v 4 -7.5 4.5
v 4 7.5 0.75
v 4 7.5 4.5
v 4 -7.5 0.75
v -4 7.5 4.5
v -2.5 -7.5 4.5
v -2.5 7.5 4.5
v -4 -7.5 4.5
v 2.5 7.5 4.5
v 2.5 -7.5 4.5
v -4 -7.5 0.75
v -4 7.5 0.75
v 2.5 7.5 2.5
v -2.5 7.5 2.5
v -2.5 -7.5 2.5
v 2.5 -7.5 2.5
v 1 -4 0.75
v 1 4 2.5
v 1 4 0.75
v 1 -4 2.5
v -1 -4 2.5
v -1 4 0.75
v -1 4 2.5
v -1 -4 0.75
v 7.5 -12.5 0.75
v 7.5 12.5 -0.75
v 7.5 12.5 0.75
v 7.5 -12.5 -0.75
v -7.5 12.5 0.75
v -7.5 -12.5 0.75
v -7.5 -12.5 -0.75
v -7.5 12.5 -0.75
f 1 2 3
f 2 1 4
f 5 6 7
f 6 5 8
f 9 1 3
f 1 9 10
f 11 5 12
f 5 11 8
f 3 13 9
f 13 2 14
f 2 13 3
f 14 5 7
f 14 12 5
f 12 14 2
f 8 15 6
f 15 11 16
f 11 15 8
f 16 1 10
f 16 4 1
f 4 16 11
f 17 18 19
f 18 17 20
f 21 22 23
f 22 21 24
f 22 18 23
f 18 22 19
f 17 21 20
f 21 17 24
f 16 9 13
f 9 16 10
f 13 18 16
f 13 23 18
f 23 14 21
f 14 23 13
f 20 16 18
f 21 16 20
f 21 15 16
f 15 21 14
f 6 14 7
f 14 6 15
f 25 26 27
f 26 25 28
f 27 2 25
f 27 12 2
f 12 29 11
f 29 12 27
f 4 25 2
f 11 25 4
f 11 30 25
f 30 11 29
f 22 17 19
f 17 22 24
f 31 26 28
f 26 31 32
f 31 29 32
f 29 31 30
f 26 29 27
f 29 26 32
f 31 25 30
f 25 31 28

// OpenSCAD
plateWidth = 15;
plateLength = 25;
standWidth  = 8;
standLength = 15;

module ledStripe(plateThickness, standHeight)
{
  difference()
  {
    translate([0, 0, 2]) 
            cube([standWidth, standLength, standHeight], true);
    translate([0,0,3]) 
            cube([2, 8, standHeight*2], true);
    translate([0,0,4]) color("blue") cube([5, 20, 3], true);
  }
}

module test(plateThickness, standHeight)
{
  cube([plateWidth,plateLength,plateThickness],true);
  //translate([-10,-10,plateThickness*-0.5]) ledStripe(10,10, plateThickness, standHeight);
  ledStripe(plateThickness, standHeight);
}

test(1.5, 5);
//translate([-30,0,0]) test(1.5, 5);
//translate([-10,0,0]) test(1.5, 6);
//translate([ 30,0,0]) test(2, 6);
//translate([ 10,0,0]) test(1.5, 7);
